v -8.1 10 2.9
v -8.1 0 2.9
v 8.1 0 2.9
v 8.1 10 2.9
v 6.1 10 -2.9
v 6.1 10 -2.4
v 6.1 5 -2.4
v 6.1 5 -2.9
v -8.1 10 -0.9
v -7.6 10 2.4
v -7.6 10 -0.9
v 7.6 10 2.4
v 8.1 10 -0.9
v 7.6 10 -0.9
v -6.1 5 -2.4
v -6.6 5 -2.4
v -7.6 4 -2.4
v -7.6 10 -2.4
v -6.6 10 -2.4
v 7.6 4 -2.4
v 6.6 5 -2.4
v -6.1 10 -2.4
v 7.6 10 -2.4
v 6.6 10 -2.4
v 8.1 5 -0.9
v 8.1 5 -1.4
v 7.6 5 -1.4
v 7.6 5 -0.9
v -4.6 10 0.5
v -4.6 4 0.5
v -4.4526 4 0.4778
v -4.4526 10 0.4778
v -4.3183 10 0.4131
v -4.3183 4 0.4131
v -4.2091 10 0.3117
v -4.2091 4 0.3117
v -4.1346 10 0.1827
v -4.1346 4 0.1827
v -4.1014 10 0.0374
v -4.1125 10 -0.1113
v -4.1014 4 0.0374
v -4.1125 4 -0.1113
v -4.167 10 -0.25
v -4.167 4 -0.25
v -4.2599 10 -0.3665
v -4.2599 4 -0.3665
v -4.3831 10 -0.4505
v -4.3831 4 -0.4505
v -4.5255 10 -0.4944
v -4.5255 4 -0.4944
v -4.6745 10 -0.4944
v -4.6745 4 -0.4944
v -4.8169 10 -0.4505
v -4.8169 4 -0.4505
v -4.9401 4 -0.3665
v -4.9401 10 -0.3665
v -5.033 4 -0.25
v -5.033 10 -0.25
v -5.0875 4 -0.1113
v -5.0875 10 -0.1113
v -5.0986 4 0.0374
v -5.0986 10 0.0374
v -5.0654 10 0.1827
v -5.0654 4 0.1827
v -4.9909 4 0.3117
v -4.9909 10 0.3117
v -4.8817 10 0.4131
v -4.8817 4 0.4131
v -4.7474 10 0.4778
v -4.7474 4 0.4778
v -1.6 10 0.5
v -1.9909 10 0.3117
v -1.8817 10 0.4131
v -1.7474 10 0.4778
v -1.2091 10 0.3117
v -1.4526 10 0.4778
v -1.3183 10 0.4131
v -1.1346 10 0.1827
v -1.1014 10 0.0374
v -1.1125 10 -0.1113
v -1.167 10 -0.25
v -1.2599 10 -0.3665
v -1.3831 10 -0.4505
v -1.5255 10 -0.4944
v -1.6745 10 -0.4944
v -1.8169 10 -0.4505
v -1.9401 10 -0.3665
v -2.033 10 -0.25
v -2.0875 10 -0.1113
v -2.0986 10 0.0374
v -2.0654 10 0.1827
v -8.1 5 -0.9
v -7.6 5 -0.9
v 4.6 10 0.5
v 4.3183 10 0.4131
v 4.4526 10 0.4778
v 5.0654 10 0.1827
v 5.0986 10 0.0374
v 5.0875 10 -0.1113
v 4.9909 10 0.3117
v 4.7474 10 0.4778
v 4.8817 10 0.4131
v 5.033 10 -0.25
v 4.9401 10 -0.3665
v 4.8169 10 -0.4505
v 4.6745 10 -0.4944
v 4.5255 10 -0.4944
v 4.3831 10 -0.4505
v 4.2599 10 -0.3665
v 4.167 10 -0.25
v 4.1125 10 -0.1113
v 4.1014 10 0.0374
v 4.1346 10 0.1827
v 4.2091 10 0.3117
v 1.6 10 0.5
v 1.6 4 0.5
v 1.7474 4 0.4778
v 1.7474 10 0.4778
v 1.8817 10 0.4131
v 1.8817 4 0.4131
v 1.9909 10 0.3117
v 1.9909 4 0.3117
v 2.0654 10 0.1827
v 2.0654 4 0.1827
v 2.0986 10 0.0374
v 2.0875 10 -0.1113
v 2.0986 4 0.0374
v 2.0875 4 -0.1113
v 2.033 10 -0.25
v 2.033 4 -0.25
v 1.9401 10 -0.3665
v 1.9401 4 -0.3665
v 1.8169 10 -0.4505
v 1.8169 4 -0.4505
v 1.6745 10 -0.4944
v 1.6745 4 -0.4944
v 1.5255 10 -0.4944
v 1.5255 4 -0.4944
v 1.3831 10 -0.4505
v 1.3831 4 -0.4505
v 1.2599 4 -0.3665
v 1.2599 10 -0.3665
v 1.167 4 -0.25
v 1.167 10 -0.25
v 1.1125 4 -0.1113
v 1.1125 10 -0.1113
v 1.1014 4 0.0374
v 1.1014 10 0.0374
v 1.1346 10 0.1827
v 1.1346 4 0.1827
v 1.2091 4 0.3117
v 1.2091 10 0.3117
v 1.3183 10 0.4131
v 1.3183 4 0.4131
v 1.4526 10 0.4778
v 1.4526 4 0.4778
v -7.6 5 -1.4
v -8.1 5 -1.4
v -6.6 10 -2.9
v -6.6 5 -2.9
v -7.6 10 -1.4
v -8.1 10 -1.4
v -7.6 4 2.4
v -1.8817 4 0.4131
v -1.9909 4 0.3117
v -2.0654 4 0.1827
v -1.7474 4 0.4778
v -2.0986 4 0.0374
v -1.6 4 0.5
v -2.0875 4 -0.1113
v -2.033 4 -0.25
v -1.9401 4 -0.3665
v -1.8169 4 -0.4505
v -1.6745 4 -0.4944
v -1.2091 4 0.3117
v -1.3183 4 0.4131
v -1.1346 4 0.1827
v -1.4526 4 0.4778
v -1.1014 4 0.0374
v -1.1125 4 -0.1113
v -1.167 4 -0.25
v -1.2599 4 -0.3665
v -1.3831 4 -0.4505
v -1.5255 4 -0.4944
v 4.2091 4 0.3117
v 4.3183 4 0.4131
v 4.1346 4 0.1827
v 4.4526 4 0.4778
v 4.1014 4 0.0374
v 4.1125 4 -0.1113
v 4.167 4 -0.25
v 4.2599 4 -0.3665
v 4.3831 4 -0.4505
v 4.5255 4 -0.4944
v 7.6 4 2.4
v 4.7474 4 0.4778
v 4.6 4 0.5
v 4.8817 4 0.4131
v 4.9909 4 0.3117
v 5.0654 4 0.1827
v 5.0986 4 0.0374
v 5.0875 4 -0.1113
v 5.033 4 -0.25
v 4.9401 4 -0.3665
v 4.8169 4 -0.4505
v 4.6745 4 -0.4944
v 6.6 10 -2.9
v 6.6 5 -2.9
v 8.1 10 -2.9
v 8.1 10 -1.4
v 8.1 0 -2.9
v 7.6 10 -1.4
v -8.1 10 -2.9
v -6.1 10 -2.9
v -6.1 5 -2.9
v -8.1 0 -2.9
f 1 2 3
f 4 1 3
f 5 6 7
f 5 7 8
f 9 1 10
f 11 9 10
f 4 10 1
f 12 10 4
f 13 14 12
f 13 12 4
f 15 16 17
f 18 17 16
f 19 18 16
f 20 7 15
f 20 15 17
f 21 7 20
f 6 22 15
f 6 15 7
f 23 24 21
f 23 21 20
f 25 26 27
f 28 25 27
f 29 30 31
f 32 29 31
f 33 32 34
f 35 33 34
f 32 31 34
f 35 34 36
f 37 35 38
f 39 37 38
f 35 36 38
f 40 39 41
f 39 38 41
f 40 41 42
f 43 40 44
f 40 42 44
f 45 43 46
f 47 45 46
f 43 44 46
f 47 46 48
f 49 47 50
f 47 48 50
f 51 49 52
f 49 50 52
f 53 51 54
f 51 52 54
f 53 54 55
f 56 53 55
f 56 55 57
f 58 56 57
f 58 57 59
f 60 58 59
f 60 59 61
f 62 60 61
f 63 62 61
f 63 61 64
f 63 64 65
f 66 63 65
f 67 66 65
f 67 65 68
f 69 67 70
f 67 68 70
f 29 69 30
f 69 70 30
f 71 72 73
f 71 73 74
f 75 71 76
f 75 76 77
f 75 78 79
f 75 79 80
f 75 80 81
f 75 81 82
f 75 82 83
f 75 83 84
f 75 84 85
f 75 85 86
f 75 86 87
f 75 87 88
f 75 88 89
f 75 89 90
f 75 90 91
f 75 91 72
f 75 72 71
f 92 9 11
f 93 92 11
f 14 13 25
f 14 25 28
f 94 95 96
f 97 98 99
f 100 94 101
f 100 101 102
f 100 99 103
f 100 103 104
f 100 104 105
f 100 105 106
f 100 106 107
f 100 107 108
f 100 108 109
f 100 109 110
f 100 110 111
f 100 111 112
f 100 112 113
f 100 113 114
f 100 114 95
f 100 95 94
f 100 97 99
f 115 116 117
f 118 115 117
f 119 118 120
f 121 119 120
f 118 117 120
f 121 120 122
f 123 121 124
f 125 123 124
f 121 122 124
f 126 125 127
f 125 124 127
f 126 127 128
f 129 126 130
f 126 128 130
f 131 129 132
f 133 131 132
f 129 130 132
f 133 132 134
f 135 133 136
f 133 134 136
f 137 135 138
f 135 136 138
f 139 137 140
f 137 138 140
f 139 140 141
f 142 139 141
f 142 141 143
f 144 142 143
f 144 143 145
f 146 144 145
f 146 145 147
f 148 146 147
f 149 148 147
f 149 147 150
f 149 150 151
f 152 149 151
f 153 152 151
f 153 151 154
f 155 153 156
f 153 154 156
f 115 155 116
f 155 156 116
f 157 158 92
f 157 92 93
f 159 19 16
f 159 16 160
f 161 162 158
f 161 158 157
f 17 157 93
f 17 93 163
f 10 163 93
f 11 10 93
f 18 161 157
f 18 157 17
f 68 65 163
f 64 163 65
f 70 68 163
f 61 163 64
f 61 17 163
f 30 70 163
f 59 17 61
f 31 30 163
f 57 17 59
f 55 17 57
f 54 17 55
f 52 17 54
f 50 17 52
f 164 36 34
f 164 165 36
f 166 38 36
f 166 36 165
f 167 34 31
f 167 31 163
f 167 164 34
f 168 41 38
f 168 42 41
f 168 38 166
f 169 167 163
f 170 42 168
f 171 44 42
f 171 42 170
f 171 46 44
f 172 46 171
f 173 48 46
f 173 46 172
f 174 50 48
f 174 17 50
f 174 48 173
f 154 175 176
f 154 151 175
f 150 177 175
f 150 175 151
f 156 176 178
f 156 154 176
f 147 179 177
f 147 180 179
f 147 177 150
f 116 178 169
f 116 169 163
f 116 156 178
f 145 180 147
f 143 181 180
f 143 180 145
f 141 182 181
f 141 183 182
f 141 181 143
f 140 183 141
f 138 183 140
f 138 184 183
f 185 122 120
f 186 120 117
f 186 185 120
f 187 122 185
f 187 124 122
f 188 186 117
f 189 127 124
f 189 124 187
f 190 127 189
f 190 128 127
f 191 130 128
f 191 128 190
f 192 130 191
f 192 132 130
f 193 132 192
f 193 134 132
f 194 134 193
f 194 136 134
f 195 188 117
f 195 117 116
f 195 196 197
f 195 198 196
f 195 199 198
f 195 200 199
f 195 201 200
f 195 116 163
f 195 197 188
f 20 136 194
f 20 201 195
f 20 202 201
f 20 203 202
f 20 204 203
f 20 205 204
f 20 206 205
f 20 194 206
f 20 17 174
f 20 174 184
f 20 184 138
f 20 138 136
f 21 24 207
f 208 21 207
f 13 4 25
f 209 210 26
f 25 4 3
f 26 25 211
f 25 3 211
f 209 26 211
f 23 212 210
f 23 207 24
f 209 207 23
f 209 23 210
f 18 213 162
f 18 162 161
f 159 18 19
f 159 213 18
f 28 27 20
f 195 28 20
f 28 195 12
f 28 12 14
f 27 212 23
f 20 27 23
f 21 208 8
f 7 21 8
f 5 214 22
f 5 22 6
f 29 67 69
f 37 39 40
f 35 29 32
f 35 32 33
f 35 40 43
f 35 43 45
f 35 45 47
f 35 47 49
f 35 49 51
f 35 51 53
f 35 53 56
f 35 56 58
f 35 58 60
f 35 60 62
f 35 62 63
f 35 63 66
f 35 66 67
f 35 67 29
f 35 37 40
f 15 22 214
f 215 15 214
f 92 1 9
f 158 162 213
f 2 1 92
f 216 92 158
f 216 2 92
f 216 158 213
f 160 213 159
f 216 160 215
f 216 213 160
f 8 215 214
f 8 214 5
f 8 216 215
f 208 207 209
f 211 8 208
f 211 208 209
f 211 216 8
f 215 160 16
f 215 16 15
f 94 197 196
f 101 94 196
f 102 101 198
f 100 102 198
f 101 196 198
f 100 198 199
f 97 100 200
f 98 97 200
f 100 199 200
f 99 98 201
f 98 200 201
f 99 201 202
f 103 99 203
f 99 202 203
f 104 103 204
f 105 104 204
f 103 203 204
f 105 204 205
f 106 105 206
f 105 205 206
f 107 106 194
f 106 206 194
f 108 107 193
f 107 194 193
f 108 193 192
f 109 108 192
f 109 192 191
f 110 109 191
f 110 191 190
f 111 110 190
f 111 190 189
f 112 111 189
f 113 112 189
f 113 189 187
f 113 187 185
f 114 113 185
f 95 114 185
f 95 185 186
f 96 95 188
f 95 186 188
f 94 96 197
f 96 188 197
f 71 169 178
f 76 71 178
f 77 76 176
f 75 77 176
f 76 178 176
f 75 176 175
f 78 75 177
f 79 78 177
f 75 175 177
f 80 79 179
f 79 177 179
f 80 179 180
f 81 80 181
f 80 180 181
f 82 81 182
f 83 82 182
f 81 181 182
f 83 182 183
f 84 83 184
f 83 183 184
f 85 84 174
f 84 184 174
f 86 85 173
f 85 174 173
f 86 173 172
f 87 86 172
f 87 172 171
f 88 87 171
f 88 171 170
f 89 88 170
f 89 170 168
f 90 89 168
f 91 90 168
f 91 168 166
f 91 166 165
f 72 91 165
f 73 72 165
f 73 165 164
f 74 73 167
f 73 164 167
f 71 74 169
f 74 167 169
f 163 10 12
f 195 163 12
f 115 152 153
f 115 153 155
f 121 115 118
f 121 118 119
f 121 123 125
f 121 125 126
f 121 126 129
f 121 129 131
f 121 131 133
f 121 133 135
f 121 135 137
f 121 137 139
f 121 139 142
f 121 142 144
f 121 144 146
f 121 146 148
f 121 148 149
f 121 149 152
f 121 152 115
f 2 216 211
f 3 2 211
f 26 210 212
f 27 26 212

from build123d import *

# Parameters (mm, degrees)
SKETCH_1_W          = 16.2
SKETCH_1_H          = 5.8
EXTRUDE_1_DEPTH     = 10
SKETCH_2_W          = 15.2
SKETCH_2_H          = 4.8
CUT_EXTRUDE_1_DEPTH = 6
SKETCH_3_R          = 0.5
EXTRUDE_2_DEPTH     = 6
SKETCH_4_W          = 0.5
SKETCH_4_H          = 0.5
CUT_EXTRUDE_2_DEPTH = 5


with BuildPart() as part:
    # Эскиз1 → Бобышка-Вытянуть1 (new body)
    with BuildSketch(Plane(origin=(0, 0, 0), x_dir=(1, 0, 0), z_dir=(0, 1, 0))):
        Rectangle(SKETCH_1_W, SKETCH_1_H)
    extrude(amount=EXTRUDE_1_DEPTH)

    # Эскиз2 → Вырез-Вытянуть1 (cut)
    with BuildSketch(Plane(origin=(0, 10, 0), x_dir=(1, 0, 0), z_dir=(0, 1, 0))):
        Rectangle(SKETCH_2_W, SKETCH_2_H)
    extrude(amount=-CUT_EXTRUDE_1_DEPTH, mode=Mode.SUBTRACT)

    # Эскиз3 → Бобышка-Вытянуть2 (add)
    with BuildSketch(Plane(origin=(0, 4, 0), x_dir=(1, 0, 0), z_dir=(0, 1, 0))):
        with Locations(Location((-4.6, 0, 0), (0, 0, 270))):
            Circle(SKETCH_3_R)
        with Locations(Location((-1.6, 0, 0), (0, 0, 270))):
            Circle(SKETCH_3_R)
        with Locations(Location((1.6, 0, 0), (0, 0, 270))):
            Circle(SKETCH_3_R)
        with Locations(Location((4.6, 0, 0), (0, 0, 270))):
            Circle(SKETCH_3_R)
    extrude(amount=EXTRUDE_2_DEPTH)

    # Эскиз4 → Вырез-Вытянуть2 (cut)
    with BuildSketch(Plane(origin=(0, 10, 0), x_dir=(1, 0, 0), z_dir=(0, 1, 0))):
        with Locations((-6.35, 2.65)):
            Rectangle(SKETCH_4_W, SKETCH_4_H)
        with Locations((-7.85, 1.15)):
            Rectangle(SKETCH_4_W, SKETCH_4_H)
    cut_extrude_2 = extrude(amount=-CUT_EXTRUDE_2_DEPTH, mode=Mode.SUBTRACT)

    # Зеркальное отражение1: Вырез-Вытянуть2 across plane
    add(cut_extrude_2.mirror(Plane(origin=(0, 0, 0), x_dir=(0, 0, 1), z_dir=(1, 0, 0))), mode=Mode.SUBTRACT)


solid = part.part
